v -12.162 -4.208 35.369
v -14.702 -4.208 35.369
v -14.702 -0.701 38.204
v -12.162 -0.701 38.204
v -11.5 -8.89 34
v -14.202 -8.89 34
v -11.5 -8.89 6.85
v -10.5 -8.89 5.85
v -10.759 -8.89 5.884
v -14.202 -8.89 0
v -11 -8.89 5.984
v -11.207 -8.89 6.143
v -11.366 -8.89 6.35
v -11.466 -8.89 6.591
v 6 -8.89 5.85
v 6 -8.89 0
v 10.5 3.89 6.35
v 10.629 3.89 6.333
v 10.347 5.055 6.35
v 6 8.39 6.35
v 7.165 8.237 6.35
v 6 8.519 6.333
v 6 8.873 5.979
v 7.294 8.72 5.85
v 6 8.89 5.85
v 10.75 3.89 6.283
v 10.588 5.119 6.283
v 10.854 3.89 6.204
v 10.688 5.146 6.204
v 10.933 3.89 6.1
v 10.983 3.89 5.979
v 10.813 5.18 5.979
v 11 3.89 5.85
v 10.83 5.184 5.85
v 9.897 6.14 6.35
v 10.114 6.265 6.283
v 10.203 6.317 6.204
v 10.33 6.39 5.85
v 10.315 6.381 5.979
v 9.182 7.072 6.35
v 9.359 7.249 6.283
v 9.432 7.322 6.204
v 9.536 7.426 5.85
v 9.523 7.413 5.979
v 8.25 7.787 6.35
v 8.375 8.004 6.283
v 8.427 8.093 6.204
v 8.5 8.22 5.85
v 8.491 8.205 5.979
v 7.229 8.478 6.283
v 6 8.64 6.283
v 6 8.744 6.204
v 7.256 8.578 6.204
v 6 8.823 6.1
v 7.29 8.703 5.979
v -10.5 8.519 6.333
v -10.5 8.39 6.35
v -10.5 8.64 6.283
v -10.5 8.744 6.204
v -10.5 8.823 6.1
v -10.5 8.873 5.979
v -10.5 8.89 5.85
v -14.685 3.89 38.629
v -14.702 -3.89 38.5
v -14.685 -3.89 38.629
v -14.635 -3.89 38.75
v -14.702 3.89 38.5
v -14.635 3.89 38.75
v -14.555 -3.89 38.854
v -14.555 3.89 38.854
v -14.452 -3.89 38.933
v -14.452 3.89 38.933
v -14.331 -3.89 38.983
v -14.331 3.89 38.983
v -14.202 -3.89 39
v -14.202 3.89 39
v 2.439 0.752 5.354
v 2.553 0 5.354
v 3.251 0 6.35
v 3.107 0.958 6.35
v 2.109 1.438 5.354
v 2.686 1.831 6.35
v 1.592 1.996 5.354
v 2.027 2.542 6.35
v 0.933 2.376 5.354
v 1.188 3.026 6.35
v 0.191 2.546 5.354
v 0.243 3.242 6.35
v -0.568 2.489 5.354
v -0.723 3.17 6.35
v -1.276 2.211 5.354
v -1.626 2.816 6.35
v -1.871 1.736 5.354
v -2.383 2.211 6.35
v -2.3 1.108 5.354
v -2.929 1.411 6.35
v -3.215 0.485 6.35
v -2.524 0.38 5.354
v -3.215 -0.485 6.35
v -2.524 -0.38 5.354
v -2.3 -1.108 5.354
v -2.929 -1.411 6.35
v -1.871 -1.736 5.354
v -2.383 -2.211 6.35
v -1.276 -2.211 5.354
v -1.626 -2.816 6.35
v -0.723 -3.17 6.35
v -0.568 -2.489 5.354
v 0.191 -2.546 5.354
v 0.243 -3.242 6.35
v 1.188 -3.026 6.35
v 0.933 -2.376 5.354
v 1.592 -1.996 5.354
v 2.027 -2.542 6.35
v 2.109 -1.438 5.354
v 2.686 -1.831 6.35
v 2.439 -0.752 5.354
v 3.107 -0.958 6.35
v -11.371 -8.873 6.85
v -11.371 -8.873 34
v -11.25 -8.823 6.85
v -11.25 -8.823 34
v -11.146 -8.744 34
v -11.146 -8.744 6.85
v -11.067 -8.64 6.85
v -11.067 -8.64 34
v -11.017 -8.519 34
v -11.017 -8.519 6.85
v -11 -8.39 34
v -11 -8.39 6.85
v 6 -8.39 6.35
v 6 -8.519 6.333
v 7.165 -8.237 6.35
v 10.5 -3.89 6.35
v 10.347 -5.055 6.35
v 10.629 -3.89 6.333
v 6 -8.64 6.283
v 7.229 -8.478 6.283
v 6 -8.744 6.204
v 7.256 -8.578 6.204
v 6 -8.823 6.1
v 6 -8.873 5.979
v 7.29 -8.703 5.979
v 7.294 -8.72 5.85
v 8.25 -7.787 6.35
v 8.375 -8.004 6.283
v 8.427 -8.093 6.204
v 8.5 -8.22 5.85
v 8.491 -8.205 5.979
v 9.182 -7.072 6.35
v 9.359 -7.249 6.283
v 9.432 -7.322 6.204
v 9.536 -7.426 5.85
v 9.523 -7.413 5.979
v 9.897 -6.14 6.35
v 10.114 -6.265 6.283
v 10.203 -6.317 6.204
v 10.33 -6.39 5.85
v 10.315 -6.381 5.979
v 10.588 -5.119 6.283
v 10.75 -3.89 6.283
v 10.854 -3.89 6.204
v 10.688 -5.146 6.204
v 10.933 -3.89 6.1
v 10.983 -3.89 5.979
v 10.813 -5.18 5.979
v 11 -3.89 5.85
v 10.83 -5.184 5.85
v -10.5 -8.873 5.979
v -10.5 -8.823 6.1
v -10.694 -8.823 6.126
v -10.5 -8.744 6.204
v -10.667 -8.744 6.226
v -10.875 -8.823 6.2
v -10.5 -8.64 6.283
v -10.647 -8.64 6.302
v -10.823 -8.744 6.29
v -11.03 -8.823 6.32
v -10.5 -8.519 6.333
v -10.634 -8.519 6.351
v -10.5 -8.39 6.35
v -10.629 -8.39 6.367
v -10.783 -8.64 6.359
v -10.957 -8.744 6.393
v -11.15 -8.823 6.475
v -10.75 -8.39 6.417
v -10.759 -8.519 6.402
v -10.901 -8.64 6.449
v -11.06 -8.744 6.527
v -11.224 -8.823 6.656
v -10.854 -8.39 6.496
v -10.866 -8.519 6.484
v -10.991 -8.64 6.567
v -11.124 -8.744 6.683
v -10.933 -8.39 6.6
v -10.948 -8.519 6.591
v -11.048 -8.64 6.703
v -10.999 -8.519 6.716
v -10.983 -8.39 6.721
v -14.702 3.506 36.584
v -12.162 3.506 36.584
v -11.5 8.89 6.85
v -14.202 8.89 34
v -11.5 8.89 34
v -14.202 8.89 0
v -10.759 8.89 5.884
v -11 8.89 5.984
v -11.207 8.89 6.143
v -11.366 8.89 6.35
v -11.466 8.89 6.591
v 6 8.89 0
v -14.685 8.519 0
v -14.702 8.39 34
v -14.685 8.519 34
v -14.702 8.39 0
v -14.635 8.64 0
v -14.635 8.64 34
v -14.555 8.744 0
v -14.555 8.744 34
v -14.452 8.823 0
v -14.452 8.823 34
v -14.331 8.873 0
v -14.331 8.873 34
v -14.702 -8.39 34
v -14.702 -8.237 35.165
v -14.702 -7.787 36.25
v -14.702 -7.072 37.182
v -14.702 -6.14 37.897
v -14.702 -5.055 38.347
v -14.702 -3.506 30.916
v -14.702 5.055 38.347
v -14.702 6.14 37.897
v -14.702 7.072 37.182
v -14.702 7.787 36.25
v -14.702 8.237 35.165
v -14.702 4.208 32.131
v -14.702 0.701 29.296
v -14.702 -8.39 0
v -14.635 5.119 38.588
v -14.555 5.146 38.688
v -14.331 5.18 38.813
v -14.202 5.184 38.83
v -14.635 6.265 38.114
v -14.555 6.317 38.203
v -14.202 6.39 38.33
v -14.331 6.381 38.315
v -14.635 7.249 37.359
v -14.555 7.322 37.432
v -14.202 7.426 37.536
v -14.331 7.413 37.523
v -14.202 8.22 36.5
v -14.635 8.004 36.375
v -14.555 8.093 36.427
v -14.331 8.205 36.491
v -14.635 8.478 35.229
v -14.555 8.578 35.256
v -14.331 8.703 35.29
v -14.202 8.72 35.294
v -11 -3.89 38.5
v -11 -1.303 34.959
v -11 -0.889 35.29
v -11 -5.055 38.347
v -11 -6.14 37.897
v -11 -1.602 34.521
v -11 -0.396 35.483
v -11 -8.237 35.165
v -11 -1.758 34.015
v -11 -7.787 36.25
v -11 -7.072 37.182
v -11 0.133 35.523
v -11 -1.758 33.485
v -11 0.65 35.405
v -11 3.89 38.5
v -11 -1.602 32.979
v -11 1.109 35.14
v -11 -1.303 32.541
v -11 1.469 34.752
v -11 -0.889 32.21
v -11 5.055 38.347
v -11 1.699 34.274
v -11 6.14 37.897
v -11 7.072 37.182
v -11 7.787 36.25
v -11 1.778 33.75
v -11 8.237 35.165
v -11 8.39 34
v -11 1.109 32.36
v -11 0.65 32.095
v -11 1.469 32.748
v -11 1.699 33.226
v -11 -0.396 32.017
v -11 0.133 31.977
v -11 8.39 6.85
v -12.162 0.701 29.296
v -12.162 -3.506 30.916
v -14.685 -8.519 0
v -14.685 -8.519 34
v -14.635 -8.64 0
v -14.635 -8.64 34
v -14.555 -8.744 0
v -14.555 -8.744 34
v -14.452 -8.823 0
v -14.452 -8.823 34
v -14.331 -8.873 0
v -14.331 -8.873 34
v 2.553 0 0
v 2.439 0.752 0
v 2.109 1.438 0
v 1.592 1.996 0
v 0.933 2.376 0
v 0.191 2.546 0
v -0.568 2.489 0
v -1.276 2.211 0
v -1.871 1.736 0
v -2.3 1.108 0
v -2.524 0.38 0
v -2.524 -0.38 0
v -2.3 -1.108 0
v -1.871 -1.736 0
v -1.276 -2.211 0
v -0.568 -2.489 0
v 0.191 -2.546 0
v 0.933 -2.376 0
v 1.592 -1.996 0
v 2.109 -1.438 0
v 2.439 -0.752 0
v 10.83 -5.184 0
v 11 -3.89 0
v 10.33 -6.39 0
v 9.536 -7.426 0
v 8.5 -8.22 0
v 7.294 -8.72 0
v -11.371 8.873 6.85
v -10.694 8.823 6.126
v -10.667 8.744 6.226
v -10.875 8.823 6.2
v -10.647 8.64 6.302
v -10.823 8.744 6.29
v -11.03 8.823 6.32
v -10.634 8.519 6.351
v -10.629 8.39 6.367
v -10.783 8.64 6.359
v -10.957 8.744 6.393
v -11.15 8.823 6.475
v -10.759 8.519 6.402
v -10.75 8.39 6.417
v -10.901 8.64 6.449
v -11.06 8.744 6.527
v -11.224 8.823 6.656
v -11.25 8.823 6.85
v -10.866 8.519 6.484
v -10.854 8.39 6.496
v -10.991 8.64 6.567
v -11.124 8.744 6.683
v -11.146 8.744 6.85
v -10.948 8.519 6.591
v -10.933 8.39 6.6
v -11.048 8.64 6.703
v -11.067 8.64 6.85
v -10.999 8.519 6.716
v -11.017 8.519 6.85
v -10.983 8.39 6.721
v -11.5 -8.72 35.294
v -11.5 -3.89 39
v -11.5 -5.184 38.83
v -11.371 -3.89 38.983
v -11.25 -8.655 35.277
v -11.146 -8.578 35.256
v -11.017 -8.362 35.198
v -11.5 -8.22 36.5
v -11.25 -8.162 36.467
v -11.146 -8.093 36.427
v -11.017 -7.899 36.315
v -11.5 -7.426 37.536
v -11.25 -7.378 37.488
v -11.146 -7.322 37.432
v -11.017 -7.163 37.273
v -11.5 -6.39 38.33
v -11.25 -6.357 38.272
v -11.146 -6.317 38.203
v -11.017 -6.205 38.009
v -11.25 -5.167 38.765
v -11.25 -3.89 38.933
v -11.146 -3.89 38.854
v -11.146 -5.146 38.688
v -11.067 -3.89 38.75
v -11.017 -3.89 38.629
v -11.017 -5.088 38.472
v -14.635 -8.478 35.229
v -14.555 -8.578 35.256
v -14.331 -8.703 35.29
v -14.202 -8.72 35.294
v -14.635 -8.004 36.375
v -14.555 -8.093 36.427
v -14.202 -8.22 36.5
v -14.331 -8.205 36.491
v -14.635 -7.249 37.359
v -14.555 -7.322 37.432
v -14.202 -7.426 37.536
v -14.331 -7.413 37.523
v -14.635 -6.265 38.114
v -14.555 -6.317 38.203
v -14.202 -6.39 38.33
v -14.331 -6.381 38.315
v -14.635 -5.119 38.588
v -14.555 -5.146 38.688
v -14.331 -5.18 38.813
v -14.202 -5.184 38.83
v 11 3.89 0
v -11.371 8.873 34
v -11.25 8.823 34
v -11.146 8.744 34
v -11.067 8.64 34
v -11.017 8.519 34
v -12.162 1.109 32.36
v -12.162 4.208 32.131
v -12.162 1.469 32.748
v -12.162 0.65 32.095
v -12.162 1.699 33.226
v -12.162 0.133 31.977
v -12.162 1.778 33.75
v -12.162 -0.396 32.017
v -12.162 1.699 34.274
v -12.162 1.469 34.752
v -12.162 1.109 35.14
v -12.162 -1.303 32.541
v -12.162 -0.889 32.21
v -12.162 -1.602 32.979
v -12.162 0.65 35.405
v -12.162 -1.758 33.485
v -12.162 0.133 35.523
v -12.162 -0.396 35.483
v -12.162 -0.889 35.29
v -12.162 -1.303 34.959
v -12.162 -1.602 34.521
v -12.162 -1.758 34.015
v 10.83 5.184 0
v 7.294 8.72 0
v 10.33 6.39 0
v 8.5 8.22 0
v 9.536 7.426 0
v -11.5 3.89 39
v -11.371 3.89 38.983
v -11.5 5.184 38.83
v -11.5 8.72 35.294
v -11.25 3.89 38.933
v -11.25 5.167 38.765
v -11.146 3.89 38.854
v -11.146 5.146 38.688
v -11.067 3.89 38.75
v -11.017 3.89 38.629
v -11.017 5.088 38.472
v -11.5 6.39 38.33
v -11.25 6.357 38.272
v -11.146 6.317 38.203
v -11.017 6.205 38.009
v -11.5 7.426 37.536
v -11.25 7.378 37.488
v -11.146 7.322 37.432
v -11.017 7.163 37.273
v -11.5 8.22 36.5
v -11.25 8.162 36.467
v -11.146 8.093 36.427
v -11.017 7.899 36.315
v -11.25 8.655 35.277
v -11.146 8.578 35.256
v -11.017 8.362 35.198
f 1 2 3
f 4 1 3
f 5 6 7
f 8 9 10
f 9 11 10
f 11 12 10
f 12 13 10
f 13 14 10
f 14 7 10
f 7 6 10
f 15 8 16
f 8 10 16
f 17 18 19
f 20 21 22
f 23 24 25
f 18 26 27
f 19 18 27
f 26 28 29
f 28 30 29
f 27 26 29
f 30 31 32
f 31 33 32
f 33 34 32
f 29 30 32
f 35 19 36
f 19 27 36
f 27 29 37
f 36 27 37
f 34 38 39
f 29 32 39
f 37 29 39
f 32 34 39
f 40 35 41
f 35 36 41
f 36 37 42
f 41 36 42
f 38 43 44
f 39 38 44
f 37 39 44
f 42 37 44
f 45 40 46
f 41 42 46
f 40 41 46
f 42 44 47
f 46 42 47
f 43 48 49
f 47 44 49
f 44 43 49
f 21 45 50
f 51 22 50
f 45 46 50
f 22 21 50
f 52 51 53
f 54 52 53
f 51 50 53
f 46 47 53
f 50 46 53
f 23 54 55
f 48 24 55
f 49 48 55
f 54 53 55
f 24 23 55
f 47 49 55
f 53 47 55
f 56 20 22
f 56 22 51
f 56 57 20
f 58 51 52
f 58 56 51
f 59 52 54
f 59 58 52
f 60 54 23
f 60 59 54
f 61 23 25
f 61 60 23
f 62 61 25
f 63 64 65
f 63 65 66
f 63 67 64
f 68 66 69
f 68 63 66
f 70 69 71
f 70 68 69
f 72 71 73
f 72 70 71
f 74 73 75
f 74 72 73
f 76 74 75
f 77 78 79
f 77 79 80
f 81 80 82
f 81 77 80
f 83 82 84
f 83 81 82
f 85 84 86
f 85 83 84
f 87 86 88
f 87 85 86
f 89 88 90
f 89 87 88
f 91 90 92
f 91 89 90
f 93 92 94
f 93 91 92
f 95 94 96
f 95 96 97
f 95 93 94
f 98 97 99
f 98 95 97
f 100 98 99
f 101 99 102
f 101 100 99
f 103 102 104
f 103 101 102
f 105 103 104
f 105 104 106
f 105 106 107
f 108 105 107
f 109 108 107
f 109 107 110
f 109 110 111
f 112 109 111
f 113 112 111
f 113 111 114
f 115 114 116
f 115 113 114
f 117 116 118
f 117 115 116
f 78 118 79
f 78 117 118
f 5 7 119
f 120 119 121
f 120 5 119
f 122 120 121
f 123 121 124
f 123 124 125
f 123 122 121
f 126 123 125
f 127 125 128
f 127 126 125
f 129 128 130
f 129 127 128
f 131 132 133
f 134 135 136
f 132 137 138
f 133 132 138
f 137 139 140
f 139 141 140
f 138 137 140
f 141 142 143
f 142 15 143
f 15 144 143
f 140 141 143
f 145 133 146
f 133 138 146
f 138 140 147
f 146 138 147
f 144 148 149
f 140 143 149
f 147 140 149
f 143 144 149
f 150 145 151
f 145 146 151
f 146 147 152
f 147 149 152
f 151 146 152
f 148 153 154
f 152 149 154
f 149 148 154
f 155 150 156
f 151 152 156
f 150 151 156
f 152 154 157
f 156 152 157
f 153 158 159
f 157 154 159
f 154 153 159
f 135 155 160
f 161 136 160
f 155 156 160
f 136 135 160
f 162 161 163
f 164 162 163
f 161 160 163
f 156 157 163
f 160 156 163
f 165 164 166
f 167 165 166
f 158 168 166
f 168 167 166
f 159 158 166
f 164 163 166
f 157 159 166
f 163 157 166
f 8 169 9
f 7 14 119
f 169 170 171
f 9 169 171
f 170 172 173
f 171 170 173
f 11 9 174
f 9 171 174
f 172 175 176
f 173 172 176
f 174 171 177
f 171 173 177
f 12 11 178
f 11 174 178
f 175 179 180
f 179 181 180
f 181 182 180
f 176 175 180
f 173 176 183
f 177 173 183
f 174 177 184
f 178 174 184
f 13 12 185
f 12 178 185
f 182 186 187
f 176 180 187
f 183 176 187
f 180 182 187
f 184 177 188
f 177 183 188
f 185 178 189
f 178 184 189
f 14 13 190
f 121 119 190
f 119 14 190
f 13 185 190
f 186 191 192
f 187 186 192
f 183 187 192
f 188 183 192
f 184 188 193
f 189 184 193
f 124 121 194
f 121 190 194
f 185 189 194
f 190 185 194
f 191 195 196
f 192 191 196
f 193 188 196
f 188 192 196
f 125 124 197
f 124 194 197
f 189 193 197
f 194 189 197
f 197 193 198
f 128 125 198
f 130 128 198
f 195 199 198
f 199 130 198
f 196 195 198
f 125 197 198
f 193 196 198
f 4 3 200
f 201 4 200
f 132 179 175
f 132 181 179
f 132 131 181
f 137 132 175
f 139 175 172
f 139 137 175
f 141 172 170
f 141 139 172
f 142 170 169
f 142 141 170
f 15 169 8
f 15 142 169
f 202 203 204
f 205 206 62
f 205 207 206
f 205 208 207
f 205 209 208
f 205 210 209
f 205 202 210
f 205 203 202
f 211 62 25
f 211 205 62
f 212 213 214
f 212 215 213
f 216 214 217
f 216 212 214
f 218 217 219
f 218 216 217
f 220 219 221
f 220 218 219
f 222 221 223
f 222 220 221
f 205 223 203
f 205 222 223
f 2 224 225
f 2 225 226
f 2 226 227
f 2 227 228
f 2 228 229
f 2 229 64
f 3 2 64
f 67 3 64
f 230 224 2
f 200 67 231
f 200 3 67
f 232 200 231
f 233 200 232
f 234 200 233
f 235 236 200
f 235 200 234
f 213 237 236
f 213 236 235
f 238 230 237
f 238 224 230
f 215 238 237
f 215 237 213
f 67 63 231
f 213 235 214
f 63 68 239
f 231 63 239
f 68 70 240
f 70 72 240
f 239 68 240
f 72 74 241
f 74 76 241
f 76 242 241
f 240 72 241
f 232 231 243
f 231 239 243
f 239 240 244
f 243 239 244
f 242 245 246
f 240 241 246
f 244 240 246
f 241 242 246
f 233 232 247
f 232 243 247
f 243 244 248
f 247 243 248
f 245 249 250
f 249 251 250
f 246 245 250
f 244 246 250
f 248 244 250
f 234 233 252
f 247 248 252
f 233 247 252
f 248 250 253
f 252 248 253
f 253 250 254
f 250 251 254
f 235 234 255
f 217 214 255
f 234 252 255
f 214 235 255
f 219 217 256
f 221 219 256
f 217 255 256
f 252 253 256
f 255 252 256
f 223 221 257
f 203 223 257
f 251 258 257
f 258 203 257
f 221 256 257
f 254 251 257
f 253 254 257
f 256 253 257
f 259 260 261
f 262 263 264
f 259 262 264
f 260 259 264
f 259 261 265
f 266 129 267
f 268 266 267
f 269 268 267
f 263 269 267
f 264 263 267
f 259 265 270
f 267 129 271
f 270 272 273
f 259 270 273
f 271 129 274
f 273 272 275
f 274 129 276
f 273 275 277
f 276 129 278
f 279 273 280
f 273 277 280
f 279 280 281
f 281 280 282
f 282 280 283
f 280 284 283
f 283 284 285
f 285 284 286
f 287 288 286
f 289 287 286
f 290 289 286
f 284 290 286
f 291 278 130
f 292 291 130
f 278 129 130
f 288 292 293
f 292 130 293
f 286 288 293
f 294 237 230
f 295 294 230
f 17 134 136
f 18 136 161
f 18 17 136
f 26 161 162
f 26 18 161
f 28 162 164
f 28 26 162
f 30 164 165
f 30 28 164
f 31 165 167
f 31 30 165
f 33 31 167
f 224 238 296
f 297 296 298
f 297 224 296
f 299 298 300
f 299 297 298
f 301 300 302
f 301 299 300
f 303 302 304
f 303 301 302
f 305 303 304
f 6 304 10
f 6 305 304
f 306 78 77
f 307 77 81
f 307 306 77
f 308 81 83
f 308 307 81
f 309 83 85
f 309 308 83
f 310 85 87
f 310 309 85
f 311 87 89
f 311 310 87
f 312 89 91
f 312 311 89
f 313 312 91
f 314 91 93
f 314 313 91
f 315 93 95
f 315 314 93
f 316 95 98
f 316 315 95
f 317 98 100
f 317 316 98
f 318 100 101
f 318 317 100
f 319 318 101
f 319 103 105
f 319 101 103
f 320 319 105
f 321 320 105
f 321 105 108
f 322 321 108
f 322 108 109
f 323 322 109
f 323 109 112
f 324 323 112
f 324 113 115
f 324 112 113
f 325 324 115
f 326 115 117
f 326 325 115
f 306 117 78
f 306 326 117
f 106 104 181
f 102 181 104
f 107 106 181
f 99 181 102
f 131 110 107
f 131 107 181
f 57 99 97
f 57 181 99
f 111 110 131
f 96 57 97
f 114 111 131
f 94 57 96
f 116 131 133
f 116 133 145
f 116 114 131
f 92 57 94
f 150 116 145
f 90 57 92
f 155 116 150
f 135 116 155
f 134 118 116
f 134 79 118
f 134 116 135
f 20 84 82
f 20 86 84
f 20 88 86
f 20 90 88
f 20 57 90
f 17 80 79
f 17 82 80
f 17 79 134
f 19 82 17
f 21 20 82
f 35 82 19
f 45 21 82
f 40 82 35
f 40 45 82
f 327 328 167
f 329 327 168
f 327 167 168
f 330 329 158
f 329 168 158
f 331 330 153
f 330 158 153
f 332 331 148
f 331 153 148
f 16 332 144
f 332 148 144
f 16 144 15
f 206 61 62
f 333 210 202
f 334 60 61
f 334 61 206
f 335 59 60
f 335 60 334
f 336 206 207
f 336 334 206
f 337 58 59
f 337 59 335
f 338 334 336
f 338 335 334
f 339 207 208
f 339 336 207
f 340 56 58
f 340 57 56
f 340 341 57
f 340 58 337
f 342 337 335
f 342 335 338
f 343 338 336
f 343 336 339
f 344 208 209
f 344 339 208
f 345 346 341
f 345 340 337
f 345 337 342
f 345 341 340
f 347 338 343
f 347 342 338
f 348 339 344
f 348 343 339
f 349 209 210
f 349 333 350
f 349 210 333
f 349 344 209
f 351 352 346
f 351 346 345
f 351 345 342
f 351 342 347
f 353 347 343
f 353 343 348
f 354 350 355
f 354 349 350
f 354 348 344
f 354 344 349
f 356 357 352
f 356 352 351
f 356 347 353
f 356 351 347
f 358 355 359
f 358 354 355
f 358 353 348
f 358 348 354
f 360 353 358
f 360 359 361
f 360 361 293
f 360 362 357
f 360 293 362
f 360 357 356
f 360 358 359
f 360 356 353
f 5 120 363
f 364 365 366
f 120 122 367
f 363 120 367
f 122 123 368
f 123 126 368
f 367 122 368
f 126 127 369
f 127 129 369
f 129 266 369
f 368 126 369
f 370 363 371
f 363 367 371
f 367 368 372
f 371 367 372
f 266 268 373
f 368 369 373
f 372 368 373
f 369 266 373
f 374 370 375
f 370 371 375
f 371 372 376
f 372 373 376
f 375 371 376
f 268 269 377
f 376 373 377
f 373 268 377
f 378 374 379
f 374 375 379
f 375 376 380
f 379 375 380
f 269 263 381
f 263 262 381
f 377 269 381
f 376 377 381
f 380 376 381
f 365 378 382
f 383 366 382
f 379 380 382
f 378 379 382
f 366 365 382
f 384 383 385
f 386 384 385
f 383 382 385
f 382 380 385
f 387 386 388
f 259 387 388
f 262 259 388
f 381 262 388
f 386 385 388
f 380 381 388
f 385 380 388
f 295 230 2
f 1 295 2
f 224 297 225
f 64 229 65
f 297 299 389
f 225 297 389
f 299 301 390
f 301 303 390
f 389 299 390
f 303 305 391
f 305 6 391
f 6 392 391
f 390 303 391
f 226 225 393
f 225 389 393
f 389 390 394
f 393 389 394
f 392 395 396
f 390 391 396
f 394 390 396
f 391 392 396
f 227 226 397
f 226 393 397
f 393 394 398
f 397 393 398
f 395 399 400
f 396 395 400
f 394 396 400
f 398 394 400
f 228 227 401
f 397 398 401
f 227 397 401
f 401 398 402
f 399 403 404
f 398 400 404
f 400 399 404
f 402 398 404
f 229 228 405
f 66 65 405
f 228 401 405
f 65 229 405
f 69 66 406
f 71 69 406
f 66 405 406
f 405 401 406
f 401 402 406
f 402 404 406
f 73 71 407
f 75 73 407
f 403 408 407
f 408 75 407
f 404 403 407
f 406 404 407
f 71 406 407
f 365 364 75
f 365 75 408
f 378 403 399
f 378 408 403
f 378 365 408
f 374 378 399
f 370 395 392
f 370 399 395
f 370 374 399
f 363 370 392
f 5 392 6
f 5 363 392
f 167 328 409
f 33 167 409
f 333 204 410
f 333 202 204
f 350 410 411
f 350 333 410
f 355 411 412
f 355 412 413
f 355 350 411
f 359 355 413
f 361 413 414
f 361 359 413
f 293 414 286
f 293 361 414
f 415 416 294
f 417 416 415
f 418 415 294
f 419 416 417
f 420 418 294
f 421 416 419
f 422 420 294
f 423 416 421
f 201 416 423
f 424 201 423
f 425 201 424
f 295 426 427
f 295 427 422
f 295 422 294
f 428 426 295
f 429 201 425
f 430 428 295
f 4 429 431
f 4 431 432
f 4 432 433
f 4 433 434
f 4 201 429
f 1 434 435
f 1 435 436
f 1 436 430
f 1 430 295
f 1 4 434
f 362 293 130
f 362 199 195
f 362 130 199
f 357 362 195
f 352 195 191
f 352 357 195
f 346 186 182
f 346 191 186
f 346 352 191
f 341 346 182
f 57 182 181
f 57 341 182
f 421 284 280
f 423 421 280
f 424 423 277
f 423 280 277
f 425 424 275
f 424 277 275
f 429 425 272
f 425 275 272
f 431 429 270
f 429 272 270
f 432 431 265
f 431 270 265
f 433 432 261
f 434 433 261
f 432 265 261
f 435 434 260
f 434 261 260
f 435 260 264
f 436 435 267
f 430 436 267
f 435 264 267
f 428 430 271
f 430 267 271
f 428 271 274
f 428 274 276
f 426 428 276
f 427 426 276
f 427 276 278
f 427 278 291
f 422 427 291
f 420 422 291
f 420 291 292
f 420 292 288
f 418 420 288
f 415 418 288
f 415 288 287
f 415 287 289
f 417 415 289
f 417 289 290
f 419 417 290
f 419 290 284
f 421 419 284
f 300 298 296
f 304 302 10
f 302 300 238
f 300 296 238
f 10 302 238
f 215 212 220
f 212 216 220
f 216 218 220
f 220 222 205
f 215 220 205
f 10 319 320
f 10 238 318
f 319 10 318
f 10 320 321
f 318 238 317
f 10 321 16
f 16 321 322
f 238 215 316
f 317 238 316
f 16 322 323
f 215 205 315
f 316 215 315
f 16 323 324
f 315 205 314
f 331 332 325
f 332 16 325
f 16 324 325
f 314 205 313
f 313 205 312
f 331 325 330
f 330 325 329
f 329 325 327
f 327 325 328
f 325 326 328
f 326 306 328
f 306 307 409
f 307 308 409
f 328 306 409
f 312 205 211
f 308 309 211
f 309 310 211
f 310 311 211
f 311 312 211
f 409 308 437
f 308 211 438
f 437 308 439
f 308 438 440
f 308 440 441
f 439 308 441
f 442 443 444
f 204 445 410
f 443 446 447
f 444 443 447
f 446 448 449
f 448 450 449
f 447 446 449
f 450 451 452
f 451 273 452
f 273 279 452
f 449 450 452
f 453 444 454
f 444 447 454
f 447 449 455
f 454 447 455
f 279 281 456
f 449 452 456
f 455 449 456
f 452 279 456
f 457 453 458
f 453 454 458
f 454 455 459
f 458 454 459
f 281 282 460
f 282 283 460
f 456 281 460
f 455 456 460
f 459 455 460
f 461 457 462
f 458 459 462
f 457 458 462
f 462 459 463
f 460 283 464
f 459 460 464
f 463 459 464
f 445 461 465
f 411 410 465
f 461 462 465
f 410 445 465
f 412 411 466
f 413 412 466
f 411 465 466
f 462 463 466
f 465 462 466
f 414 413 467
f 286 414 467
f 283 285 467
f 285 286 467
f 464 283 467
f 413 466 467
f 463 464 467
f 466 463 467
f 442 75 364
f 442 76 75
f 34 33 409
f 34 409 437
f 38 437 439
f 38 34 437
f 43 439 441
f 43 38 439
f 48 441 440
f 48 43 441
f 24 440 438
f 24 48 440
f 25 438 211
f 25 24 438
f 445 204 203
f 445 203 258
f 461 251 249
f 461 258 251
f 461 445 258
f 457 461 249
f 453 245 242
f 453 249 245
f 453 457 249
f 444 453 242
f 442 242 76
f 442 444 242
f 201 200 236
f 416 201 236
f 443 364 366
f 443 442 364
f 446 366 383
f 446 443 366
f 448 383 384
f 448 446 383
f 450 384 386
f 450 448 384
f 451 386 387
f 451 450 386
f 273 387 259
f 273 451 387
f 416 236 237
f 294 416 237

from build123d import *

# Parameters (mm, degrees)
F0_W      = 22
F0_H      = 17.78
F1_DEPTH  = 6.35
F2_W      = 3.7016793489
F2_H      = 17.78
F3_DEPTH  = 39
F6_R      = 2.5527
F8_DEPTH  = 25
F4_R      = 3.2512
F7_R      = 1.524
F10_R     = 1.778
F11_DEPTH = 25
F12_R     = 1.778
F13_DEPTH = 2.54
F14_R     = 5
F15_R     = 0.5


with BuildPart() as f1:
    # F0 (on Top) → F1 (new body)
    with BuildSketch(Plane.XY):
        Rectangle(F0_W, F0_H)
    extrude(amount=F1_DEPTH)

    # F2 (on Top) → F3 (join)
    with BuildSketch(Plane.XY):
        with Locations((-12.8508396745, 0)):
            Rectangle(F2_W, F2_H)
    extrude(amount=F3_DEPTH)

    # F6 (on Top) → F8 (cut)
    with BuildSketch(Plane.XY):
        Circle(F6_R)
    extrude(amount=F8_DEPTH, mode=Mode.SUBTRACT)

    # F4 (on face) → F9 section 0
    with BuildSketch(Plane.XY.offset(6.35)):
        Circle(F4_R)
    # F7 (on offset) → F9 section 1
    with BuildSketch(Plane.XY.offset(3.8862)):
        Circle(F7_R)
    loft(mode=Mode.SUBTRACT)

    # F10 (on face) → F11 (cut)
    with BuildSketch(Plane.YZ.offset(-11)):
        with Locations((0, 33.75)):
            Circle(F10_R)
    extrude(amount=-F11_DEPTH, mode=Mode.SUBTRACT)

    # F12 (on face) → F13 (cut)
    with BuildSketch(Plane(origin=(-14.7016793489, 0, 0), x_dir=(0, -1, 0), z_dir=(-1, 0, 0))):
        Polygon((3.5062095774, 30.91573349), (4.2076515874, 35.36933331), (0.7014420101, 38.20359982), (-3.5062095774, 36.58426651), (-4.2076515874, 32.13066669), (-0.7014420101, 29.29640018), align=None)
        with Locations((0, 33.75)):
            Circle(F12_R, mode=Mode.SUBTRACT)
    extrude(amount=-F13_DEPTH, mode=Mode.SUBTRACT)

    # F14
    f14_edges = [f1.edges().sort_by_distance(p)[0] for p in [
        (11, 8.89, 3.175),
        (11, -8.89, 3.175),
        (-12.85084, 8.89, 39),
        (-12.85084, -8.89, 39),
    ]]
    fillet(f14_edges, radius=F14_R)

    # F15
    f15_edges = [f1.edges().sort_by_distance(p)[0] for p in [
        (-11, -8.89, 20.175),
        (-11, 0, 6.35),
        (-14.701679, -8.89, 17),
        (-14.701679, -7.425534, 37.535534),
        (11, 0, 6.35),
        (9.535534, -7.425534, 6.35),
        (9.535534, 7.425534, 6.35),
        (-2.5, -8.89, 6.35),
        (-2.5, 8.89, 6.35),
        (-11, 8.89, 20.175),
        (-14.701679, 8.89, 17),
        (-14.701679, 7.425534, 37.535534),
        (-14.701679, 0, 39),
        (-11, 7.425534, 37.535534),
        (-11, 0, 39),
        (-11, -7.425534, 37.535534),
    ]]
    fillet(f15_edges, radius=F15_R)


solid = f1.part
